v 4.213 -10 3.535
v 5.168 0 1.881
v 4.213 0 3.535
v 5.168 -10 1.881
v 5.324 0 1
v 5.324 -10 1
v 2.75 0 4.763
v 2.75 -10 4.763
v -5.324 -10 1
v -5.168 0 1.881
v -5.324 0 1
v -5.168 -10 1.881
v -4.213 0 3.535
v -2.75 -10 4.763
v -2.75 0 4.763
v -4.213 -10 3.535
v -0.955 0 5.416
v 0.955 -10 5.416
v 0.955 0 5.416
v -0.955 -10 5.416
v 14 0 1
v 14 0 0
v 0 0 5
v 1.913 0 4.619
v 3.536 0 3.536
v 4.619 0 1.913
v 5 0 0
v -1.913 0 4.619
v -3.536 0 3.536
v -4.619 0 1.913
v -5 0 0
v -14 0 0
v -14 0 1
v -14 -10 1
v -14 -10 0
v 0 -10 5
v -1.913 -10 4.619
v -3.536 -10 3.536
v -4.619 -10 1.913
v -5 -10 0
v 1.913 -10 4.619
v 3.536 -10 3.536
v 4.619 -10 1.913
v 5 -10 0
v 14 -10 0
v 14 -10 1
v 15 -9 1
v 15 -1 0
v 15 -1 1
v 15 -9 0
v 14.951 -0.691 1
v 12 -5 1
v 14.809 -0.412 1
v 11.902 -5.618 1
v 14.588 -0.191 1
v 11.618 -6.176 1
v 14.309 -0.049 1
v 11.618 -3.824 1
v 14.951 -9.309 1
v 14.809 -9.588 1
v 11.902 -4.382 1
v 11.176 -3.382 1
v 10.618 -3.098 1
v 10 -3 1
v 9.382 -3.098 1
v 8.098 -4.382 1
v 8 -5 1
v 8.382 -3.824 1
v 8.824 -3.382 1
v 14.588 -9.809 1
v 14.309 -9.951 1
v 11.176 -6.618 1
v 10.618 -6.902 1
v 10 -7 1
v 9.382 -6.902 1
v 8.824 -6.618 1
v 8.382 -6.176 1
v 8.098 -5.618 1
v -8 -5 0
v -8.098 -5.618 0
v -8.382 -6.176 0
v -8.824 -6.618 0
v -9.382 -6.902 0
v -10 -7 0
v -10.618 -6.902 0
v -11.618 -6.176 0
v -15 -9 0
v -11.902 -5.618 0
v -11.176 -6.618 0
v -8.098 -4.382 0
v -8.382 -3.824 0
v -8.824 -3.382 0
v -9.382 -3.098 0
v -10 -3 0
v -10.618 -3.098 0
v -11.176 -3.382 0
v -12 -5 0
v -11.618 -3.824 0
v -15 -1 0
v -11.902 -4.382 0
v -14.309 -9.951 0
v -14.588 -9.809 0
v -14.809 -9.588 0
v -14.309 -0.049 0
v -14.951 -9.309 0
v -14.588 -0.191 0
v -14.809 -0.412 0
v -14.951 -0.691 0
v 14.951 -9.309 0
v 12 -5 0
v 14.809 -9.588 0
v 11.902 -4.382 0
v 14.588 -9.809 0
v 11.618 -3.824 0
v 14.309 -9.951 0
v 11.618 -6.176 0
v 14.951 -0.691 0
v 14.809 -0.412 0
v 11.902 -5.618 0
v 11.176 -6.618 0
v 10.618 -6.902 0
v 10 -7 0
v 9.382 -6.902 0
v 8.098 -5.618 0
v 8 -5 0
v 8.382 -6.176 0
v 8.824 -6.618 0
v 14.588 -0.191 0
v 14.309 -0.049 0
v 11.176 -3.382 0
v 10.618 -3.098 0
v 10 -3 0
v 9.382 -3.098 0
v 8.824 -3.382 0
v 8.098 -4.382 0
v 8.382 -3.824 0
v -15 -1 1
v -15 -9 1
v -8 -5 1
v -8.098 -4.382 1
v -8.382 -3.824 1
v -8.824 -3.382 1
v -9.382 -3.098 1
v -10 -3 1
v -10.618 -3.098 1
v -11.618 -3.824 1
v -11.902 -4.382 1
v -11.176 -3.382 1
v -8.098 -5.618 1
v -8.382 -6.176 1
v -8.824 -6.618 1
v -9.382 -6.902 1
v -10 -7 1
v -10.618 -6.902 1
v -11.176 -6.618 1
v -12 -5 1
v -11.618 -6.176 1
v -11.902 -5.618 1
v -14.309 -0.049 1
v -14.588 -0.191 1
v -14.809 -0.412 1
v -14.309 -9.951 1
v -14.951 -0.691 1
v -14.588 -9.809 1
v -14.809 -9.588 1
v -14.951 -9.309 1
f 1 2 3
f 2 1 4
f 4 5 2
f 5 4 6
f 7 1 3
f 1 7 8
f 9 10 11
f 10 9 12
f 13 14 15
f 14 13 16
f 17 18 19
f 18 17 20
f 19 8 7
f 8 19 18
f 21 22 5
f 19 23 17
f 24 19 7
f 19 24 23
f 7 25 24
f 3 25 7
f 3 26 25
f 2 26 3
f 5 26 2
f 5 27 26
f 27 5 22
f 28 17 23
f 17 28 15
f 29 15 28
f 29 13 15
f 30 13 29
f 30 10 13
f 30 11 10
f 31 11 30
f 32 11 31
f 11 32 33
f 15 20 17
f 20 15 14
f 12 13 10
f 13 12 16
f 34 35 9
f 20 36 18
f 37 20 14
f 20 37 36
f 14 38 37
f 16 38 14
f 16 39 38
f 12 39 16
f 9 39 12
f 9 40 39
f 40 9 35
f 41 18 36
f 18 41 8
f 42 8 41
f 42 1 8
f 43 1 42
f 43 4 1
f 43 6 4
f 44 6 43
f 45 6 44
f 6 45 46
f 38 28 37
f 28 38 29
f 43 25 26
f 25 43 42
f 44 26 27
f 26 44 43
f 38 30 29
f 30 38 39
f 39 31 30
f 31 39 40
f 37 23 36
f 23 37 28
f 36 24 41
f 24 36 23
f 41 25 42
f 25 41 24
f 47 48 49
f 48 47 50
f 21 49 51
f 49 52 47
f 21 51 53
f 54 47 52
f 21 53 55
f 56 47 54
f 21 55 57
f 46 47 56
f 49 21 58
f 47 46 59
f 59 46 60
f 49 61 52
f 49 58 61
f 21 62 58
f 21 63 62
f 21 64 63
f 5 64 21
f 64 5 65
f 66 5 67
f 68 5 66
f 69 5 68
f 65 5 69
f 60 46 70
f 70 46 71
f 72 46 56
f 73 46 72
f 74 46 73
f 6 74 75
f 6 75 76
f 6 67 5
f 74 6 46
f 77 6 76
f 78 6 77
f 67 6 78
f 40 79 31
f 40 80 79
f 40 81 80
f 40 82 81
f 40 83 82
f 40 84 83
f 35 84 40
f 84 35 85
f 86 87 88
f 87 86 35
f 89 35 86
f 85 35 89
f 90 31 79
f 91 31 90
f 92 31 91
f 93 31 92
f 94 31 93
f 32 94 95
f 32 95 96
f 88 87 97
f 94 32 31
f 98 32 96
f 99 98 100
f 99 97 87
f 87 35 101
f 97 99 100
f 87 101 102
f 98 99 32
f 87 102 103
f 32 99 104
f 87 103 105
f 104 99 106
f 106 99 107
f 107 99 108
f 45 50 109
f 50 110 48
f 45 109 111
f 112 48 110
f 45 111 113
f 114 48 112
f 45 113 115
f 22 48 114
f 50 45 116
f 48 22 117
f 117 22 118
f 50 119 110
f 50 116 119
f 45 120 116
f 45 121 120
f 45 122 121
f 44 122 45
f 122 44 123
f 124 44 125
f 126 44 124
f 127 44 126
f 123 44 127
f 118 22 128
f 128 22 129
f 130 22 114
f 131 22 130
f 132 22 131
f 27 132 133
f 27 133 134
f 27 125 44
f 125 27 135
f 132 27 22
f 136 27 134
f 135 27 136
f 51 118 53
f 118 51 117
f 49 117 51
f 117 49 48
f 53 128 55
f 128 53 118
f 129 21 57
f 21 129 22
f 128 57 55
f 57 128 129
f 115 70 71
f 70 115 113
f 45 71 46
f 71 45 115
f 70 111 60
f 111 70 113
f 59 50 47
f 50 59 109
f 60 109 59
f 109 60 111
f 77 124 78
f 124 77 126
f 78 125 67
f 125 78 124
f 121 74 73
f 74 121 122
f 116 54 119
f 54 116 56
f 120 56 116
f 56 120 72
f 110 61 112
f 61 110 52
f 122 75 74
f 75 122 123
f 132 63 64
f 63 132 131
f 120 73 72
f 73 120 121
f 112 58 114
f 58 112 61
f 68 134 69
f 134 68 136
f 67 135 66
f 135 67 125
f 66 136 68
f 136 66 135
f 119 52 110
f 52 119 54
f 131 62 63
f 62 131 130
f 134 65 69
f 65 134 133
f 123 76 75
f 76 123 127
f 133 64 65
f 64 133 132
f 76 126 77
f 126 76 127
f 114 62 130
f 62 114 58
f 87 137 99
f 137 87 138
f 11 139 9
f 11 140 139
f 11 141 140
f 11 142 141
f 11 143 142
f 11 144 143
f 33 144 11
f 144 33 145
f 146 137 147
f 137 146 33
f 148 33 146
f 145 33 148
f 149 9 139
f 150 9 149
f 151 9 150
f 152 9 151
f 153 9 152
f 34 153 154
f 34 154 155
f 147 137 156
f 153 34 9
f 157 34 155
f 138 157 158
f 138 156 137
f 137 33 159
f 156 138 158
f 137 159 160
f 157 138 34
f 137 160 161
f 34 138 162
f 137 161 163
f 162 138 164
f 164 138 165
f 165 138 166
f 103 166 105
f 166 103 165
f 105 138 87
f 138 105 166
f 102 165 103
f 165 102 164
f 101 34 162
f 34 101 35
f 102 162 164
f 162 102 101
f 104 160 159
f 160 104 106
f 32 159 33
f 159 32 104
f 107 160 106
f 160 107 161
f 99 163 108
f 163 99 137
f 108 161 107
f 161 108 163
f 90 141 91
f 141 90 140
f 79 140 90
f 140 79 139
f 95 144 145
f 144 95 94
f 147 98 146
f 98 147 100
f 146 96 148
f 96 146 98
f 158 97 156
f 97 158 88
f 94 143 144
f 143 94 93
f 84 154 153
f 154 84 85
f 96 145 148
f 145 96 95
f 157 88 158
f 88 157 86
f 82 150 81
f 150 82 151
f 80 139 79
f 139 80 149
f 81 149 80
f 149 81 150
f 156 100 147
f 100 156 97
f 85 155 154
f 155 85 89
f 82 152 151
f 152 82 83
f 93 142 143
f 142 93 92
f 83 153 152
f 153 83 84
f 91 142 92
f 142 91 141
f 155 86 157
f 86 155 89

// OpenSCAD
radius = 5;
width = 10;
weight = 0.5;

holder_weight = 1;
holder_round = 1;
holder_lenght = 10;
holder_hole_radius = 2;


difference()
{
    translate([0,0,0])
    {
        rotate(a = [90,0,0])
        {
            difference(){
                cylinder(r = radius + weight, h = width);
                cylinder(r = radius , h = width); 
            }
        }
        translate([radius + holder_lenght,0,0])
        {
            difference()
            {
                rotate([0,0,180])
                {
                  holder(width, holder_weight, holder_lenght, holder_round, holder_hole_radius);
//                rounded_cube([holder_lenght,width,holder_weight], holder_round,true,false,false,true);
//                translate([2.5,2.5,0])
//                {
//                    cylinder(r=holder_hole_radius,h=holder_weight, $fn=20);
//                }
                }
            }
        }
        translate([-radius - holder_lenght,-width,0])
        {
            difference()
            {
                holder(width, holder_weight, holder_lenght, holder_round, holder_hole_radius);
//                rounded_cube([holder_lenght,width,holder_weight], holder_round,false,true,true,false);
//                translate([2.5,2.5,0])
//                {
//                    cylinder(r=holder_hole_radius,h=holder_weight, $fn=20);
//                }
            }
        }
    }
   
    surface(100,100);
}



////surface(200,200);

module holder(h_width, h_weight, h_length, h_radius, h_hole)
{
    difference()
    {
        rounded_cube([h_length,h_width,h_weight], h_radius,false,true,true,false);
        translate([h_length * 0.5,h_width * 0.5,0])
        {
            cylinder(r=h_hole,h=h_weight, $fn=20);
        }
    }
}

module rounded_cube(cube_dimensions, radius,tr = true,br = true,bl = true,tl = true)
{
    difference()
    {
        cube(cube_dimensions);
        if(tr == true)
        {
            translate([cube_dimensions[0] - radius,radius,0])
            {
                rotate([0,0,270])
                {
                    corner(radius,cube_dimensions[2]);
                }
            }   
        }
        if(br == true)
        {
            translate([radius,radius,0])
            {
                rotate([0,0,180])
                {
                    corner(radius,cube_dimensions[2]);
                }
            }
        }
        if(bl == true)
        {
            translate([radius,cube_dimensions[1] - radius,0])
            {
                rotate([0,0,90])
                {
                    corner(radius,cube_dimensions[2]);
                }
            }
        }
        if(tl == true)
        {
            translate([cube_dimensions[0]- radius,cube_dimensions[1] - radius,0])
            {
                rotate([0,0,0])
                {
                    corner(radius,cube_dimensions[2]);
                }
            }
        }             
    }
}

module corner(r,h)
{
    difference()
    {
        color("red") cube([r,r,h]);
        cylinder(r=r, h=h, $fn=20);
    }
}

module surface(axe_x, axe_y)
{
    surface_height = 100;
    translate([-(axe_x*0.5),-(axe_y*0.5),-surface_height])
    {
        color("red")
        {
            cube([axe_x,axe_y,surface_height]);
        }
    }
}
